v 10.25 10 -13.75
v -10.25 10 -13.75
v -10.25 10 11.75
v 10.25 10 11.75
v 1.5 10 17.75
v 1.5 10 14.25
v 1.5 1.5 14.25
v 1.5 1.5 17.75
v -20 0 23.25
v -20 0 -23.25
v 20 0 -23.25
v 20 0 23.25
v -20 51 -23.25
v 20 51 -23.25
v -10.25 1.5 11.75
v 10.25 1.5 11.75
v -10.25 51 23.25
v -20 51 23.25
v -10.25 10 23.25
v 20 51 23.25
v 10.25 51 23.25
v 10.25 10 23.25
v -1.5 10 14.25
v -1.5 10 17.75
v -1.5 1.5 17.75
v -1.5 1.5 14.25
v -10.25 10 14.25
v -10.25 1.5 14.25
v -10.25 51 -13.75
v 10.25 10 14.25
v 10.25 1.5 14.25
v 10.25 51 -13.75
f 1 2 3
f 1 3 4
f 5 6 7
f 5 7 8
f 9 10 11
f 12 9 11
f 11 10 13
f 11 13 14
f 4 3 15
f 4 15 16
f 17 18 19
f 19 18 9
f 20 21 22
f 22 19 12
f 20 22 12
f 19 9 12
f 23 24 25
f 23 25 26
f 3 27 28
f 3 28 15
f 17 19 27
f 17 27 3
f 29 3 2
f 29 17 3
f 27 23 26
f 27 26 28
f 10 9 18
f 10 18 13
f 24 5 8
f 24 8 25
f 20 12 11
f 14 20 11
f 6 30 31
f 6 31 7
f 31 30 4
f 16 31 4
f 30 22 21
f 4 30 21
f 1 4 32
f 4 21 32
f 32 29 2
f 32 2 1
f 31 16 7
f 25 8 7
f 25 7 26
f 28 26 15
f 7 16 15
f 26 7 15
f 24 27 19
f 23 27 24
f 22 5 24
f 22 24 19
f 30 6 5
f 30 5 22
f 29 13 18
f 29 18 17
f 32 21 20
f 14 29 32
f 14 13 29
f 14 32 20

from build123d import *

# Parameters (mm, degrees)
SKETCH1_W           = 40
SKETCH1_H           = 46.5
BOSS_EXTRUDE1_DEPTH = 51
SKETCH2_W           = 20.5
SKETCH2_H           = 37
CUT_EXTRUDE1_DEPTH  = 41
CUT_EXTRUDE2_DEPTH  = 8.5


with BuildPart() as part:
    # Sketch1 → Boss-Extrude1 (new body)
    with BuildSketch(Plane(origin=(0, 0, 0), x_dir=(1, 0, 0), z_dir=(0, 1, 0))):
        Rectangle(SKETCH1_W, SKETCH1_H)
    extrude(amount=BOSS_EXTRUDE1_DEPTH)

    # Sketch2 → Cut-Extrude1 (cut)
    with BuildSketch(Plane(origin=(0, 51, 0), x_dir=(1, 0, 0), z_dir=(0, 1, 0))):
        with Locations((0, -4.75)):
            Rectangle(SKETCH2_W, SKETCH2_H)
    extrude(amount=-CUT_EXTRUDE1_DEPTH, mode=Mode.SUBTRACT)

    # Sketch3 → Cut-Extrude2 (cut)
    with BuildSketch(Plane(origin=(0, 10, 0), x_dir=(1, 0, 0), z_dir=(0, 1, 0))):
        Polygon((-10.25, -11.75), (10.25, -11.75), (10.25, -14.25), (1.5, -14.25), (1.5, -17.75), (-1.5, -17.75), (-1.5, -14.25), (-10.25, -14.25), align=None)
    extrude(amount=-CUT_EXTRUDE2_DEPTH, mode=Mode.SUBTRACT)


solid = part.part
